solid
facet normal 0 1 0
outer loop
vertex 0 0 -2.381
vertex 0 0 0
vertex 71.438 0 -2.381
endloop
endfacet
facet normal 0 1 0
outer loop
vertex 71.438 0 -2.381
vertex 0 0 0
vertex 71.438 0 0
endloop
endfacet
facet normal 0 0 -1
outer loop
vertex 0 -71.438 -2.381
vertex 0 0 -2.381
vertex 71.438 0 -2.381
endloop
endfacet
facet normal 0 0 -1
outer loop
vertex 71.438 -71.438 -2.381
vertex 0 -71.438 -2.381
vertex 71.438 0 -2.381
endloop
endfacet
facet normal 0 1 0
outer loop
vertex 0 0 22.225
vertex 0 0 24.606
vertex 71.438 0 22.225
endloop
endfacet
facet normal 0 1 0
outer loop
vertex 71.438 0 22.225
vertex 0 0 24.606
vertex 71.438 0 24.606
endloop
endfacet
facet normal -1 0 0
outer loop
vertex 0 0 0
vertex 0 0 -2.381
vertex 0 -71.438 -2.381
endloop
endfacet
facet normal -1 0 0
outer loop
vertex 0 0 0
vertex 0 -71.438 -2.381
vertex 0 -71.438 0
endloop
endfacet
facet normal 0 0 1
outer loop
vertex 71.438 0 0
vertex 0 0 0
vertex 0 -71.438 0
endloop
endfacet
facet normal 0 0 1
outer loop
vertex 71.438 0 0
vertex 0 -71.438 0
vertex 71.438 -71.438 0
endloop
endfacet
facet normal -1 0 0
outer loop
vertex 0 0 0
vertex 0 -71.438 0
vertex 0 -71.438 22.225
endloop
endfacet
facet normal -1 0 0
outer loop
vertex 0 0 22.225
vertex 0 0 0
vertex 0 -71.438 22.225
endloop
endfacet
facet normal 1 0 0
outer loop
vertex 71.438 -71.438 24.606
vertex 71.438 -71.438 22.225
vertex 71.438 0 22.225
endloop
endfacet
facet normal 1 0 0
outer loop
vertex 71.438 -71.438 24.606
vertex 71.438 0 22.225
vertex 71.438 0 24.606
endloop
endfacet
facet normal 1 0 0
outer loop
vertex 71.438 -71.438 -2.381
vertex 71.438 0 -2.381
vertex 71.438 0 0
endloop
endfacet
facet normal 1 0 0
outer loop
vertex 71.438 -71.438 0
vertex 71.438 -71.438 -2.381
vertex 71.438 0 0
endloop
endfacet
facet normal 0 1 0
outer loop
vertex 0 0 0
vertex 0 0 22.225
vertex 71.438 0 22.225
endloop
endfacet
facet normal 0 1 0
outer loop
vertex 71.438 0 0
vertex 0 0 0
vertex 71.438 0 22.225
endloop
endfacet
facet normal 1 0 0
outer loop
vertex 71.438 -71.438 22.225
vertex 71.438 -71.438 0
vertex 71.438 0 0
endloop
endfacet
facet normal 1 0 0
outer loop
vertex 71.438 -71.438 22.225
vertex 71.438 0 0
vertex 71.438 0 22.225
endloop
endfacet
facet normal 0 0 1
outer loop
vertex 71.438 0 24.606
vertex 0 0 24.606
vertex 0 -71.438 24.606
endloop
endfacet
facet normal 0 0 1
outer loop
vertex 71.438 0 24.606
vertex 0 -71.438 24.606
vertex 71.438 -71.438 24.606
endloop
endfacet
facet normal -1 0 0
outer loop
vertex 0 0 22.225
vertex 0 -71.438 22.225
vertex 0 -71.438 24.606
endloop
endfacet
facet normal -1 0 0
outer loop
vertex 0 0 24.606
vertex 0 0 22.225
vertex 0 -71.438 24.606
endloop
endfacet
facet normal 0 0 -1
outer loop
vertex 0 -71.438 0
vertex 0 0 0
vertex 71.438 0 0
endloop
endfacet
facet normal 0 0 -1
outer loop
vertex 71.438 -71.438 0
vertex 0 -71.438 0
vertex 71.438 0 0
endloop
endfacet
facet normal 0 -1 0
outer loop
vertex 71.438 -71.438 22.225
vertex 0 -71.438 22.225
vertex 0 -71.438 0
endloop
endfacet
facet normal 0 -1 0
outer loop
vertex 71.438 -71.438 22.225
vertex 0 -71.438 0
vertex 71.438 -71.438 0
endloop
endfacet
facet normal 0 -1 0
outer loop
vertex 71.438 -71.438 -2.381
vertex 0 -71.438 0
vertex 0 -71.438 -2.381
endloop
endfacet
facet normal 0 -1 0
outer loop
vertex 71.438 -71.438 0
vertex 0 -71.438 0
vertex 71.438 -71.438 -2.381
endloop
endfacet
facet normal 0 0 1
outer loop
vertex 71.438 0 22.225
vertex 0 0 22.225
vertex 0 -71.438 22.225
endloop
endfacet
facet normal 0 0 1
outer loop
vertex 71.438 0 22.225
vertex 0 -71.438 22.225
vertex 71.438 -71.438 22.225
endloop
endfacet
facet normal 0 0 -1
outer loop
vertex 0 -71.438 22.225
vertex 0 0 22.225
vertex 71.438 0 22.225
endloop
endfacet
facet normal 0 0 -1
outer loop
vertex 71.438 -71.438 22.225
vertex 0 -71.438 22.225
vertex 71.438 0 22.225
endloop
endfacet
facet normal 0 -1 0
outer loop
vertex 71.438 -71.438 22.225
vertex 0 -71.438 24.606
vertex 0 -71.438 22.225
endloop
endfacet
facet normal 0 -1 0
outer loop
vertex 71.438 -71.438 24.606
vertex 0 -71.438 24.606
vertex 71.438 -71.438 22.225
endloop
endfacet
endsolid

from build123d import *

# Parameters (mm, degrees)
F0_W     = 71.4375
F0_H     = 22.225
F1_DEPTH = 71.4375
F2_W     = 71.4375
F2_H     = 2.38125
F3_DEPTH = 71.4375
F4_DEPTH = 71.4375


with BuildPart() as f1:
    # F0 (on Front) → F1 (new body)
    with BuildSketch(Plane.XZ):
        with Locations((35.71875, 11.1125)):
            Rectangle(F0_W, F0_H)
    extrude(amount=F1_DEPTH)


with BuildPart() as f3:
    # F2 (on Front) → F3 (new body)
    with BuildSketch(Plane.XZ):
        with Locations((35.71875, 23.415625)):
            Rectangle(F2_W, F2_H)
    extrude(amount=F3_DEPTH)


with BuildPart() as f4:
    # F2 (on Front) → F4 (new body)
    with BuildSketch(Plane.XZ):
        with Locations((35.71875, -1.190625)):
            Rectangle(F2_W, F2_H)
    extrude(amount=F4_DEPTH)


solid = Compound([f1.part, f3.part, f4.part])
